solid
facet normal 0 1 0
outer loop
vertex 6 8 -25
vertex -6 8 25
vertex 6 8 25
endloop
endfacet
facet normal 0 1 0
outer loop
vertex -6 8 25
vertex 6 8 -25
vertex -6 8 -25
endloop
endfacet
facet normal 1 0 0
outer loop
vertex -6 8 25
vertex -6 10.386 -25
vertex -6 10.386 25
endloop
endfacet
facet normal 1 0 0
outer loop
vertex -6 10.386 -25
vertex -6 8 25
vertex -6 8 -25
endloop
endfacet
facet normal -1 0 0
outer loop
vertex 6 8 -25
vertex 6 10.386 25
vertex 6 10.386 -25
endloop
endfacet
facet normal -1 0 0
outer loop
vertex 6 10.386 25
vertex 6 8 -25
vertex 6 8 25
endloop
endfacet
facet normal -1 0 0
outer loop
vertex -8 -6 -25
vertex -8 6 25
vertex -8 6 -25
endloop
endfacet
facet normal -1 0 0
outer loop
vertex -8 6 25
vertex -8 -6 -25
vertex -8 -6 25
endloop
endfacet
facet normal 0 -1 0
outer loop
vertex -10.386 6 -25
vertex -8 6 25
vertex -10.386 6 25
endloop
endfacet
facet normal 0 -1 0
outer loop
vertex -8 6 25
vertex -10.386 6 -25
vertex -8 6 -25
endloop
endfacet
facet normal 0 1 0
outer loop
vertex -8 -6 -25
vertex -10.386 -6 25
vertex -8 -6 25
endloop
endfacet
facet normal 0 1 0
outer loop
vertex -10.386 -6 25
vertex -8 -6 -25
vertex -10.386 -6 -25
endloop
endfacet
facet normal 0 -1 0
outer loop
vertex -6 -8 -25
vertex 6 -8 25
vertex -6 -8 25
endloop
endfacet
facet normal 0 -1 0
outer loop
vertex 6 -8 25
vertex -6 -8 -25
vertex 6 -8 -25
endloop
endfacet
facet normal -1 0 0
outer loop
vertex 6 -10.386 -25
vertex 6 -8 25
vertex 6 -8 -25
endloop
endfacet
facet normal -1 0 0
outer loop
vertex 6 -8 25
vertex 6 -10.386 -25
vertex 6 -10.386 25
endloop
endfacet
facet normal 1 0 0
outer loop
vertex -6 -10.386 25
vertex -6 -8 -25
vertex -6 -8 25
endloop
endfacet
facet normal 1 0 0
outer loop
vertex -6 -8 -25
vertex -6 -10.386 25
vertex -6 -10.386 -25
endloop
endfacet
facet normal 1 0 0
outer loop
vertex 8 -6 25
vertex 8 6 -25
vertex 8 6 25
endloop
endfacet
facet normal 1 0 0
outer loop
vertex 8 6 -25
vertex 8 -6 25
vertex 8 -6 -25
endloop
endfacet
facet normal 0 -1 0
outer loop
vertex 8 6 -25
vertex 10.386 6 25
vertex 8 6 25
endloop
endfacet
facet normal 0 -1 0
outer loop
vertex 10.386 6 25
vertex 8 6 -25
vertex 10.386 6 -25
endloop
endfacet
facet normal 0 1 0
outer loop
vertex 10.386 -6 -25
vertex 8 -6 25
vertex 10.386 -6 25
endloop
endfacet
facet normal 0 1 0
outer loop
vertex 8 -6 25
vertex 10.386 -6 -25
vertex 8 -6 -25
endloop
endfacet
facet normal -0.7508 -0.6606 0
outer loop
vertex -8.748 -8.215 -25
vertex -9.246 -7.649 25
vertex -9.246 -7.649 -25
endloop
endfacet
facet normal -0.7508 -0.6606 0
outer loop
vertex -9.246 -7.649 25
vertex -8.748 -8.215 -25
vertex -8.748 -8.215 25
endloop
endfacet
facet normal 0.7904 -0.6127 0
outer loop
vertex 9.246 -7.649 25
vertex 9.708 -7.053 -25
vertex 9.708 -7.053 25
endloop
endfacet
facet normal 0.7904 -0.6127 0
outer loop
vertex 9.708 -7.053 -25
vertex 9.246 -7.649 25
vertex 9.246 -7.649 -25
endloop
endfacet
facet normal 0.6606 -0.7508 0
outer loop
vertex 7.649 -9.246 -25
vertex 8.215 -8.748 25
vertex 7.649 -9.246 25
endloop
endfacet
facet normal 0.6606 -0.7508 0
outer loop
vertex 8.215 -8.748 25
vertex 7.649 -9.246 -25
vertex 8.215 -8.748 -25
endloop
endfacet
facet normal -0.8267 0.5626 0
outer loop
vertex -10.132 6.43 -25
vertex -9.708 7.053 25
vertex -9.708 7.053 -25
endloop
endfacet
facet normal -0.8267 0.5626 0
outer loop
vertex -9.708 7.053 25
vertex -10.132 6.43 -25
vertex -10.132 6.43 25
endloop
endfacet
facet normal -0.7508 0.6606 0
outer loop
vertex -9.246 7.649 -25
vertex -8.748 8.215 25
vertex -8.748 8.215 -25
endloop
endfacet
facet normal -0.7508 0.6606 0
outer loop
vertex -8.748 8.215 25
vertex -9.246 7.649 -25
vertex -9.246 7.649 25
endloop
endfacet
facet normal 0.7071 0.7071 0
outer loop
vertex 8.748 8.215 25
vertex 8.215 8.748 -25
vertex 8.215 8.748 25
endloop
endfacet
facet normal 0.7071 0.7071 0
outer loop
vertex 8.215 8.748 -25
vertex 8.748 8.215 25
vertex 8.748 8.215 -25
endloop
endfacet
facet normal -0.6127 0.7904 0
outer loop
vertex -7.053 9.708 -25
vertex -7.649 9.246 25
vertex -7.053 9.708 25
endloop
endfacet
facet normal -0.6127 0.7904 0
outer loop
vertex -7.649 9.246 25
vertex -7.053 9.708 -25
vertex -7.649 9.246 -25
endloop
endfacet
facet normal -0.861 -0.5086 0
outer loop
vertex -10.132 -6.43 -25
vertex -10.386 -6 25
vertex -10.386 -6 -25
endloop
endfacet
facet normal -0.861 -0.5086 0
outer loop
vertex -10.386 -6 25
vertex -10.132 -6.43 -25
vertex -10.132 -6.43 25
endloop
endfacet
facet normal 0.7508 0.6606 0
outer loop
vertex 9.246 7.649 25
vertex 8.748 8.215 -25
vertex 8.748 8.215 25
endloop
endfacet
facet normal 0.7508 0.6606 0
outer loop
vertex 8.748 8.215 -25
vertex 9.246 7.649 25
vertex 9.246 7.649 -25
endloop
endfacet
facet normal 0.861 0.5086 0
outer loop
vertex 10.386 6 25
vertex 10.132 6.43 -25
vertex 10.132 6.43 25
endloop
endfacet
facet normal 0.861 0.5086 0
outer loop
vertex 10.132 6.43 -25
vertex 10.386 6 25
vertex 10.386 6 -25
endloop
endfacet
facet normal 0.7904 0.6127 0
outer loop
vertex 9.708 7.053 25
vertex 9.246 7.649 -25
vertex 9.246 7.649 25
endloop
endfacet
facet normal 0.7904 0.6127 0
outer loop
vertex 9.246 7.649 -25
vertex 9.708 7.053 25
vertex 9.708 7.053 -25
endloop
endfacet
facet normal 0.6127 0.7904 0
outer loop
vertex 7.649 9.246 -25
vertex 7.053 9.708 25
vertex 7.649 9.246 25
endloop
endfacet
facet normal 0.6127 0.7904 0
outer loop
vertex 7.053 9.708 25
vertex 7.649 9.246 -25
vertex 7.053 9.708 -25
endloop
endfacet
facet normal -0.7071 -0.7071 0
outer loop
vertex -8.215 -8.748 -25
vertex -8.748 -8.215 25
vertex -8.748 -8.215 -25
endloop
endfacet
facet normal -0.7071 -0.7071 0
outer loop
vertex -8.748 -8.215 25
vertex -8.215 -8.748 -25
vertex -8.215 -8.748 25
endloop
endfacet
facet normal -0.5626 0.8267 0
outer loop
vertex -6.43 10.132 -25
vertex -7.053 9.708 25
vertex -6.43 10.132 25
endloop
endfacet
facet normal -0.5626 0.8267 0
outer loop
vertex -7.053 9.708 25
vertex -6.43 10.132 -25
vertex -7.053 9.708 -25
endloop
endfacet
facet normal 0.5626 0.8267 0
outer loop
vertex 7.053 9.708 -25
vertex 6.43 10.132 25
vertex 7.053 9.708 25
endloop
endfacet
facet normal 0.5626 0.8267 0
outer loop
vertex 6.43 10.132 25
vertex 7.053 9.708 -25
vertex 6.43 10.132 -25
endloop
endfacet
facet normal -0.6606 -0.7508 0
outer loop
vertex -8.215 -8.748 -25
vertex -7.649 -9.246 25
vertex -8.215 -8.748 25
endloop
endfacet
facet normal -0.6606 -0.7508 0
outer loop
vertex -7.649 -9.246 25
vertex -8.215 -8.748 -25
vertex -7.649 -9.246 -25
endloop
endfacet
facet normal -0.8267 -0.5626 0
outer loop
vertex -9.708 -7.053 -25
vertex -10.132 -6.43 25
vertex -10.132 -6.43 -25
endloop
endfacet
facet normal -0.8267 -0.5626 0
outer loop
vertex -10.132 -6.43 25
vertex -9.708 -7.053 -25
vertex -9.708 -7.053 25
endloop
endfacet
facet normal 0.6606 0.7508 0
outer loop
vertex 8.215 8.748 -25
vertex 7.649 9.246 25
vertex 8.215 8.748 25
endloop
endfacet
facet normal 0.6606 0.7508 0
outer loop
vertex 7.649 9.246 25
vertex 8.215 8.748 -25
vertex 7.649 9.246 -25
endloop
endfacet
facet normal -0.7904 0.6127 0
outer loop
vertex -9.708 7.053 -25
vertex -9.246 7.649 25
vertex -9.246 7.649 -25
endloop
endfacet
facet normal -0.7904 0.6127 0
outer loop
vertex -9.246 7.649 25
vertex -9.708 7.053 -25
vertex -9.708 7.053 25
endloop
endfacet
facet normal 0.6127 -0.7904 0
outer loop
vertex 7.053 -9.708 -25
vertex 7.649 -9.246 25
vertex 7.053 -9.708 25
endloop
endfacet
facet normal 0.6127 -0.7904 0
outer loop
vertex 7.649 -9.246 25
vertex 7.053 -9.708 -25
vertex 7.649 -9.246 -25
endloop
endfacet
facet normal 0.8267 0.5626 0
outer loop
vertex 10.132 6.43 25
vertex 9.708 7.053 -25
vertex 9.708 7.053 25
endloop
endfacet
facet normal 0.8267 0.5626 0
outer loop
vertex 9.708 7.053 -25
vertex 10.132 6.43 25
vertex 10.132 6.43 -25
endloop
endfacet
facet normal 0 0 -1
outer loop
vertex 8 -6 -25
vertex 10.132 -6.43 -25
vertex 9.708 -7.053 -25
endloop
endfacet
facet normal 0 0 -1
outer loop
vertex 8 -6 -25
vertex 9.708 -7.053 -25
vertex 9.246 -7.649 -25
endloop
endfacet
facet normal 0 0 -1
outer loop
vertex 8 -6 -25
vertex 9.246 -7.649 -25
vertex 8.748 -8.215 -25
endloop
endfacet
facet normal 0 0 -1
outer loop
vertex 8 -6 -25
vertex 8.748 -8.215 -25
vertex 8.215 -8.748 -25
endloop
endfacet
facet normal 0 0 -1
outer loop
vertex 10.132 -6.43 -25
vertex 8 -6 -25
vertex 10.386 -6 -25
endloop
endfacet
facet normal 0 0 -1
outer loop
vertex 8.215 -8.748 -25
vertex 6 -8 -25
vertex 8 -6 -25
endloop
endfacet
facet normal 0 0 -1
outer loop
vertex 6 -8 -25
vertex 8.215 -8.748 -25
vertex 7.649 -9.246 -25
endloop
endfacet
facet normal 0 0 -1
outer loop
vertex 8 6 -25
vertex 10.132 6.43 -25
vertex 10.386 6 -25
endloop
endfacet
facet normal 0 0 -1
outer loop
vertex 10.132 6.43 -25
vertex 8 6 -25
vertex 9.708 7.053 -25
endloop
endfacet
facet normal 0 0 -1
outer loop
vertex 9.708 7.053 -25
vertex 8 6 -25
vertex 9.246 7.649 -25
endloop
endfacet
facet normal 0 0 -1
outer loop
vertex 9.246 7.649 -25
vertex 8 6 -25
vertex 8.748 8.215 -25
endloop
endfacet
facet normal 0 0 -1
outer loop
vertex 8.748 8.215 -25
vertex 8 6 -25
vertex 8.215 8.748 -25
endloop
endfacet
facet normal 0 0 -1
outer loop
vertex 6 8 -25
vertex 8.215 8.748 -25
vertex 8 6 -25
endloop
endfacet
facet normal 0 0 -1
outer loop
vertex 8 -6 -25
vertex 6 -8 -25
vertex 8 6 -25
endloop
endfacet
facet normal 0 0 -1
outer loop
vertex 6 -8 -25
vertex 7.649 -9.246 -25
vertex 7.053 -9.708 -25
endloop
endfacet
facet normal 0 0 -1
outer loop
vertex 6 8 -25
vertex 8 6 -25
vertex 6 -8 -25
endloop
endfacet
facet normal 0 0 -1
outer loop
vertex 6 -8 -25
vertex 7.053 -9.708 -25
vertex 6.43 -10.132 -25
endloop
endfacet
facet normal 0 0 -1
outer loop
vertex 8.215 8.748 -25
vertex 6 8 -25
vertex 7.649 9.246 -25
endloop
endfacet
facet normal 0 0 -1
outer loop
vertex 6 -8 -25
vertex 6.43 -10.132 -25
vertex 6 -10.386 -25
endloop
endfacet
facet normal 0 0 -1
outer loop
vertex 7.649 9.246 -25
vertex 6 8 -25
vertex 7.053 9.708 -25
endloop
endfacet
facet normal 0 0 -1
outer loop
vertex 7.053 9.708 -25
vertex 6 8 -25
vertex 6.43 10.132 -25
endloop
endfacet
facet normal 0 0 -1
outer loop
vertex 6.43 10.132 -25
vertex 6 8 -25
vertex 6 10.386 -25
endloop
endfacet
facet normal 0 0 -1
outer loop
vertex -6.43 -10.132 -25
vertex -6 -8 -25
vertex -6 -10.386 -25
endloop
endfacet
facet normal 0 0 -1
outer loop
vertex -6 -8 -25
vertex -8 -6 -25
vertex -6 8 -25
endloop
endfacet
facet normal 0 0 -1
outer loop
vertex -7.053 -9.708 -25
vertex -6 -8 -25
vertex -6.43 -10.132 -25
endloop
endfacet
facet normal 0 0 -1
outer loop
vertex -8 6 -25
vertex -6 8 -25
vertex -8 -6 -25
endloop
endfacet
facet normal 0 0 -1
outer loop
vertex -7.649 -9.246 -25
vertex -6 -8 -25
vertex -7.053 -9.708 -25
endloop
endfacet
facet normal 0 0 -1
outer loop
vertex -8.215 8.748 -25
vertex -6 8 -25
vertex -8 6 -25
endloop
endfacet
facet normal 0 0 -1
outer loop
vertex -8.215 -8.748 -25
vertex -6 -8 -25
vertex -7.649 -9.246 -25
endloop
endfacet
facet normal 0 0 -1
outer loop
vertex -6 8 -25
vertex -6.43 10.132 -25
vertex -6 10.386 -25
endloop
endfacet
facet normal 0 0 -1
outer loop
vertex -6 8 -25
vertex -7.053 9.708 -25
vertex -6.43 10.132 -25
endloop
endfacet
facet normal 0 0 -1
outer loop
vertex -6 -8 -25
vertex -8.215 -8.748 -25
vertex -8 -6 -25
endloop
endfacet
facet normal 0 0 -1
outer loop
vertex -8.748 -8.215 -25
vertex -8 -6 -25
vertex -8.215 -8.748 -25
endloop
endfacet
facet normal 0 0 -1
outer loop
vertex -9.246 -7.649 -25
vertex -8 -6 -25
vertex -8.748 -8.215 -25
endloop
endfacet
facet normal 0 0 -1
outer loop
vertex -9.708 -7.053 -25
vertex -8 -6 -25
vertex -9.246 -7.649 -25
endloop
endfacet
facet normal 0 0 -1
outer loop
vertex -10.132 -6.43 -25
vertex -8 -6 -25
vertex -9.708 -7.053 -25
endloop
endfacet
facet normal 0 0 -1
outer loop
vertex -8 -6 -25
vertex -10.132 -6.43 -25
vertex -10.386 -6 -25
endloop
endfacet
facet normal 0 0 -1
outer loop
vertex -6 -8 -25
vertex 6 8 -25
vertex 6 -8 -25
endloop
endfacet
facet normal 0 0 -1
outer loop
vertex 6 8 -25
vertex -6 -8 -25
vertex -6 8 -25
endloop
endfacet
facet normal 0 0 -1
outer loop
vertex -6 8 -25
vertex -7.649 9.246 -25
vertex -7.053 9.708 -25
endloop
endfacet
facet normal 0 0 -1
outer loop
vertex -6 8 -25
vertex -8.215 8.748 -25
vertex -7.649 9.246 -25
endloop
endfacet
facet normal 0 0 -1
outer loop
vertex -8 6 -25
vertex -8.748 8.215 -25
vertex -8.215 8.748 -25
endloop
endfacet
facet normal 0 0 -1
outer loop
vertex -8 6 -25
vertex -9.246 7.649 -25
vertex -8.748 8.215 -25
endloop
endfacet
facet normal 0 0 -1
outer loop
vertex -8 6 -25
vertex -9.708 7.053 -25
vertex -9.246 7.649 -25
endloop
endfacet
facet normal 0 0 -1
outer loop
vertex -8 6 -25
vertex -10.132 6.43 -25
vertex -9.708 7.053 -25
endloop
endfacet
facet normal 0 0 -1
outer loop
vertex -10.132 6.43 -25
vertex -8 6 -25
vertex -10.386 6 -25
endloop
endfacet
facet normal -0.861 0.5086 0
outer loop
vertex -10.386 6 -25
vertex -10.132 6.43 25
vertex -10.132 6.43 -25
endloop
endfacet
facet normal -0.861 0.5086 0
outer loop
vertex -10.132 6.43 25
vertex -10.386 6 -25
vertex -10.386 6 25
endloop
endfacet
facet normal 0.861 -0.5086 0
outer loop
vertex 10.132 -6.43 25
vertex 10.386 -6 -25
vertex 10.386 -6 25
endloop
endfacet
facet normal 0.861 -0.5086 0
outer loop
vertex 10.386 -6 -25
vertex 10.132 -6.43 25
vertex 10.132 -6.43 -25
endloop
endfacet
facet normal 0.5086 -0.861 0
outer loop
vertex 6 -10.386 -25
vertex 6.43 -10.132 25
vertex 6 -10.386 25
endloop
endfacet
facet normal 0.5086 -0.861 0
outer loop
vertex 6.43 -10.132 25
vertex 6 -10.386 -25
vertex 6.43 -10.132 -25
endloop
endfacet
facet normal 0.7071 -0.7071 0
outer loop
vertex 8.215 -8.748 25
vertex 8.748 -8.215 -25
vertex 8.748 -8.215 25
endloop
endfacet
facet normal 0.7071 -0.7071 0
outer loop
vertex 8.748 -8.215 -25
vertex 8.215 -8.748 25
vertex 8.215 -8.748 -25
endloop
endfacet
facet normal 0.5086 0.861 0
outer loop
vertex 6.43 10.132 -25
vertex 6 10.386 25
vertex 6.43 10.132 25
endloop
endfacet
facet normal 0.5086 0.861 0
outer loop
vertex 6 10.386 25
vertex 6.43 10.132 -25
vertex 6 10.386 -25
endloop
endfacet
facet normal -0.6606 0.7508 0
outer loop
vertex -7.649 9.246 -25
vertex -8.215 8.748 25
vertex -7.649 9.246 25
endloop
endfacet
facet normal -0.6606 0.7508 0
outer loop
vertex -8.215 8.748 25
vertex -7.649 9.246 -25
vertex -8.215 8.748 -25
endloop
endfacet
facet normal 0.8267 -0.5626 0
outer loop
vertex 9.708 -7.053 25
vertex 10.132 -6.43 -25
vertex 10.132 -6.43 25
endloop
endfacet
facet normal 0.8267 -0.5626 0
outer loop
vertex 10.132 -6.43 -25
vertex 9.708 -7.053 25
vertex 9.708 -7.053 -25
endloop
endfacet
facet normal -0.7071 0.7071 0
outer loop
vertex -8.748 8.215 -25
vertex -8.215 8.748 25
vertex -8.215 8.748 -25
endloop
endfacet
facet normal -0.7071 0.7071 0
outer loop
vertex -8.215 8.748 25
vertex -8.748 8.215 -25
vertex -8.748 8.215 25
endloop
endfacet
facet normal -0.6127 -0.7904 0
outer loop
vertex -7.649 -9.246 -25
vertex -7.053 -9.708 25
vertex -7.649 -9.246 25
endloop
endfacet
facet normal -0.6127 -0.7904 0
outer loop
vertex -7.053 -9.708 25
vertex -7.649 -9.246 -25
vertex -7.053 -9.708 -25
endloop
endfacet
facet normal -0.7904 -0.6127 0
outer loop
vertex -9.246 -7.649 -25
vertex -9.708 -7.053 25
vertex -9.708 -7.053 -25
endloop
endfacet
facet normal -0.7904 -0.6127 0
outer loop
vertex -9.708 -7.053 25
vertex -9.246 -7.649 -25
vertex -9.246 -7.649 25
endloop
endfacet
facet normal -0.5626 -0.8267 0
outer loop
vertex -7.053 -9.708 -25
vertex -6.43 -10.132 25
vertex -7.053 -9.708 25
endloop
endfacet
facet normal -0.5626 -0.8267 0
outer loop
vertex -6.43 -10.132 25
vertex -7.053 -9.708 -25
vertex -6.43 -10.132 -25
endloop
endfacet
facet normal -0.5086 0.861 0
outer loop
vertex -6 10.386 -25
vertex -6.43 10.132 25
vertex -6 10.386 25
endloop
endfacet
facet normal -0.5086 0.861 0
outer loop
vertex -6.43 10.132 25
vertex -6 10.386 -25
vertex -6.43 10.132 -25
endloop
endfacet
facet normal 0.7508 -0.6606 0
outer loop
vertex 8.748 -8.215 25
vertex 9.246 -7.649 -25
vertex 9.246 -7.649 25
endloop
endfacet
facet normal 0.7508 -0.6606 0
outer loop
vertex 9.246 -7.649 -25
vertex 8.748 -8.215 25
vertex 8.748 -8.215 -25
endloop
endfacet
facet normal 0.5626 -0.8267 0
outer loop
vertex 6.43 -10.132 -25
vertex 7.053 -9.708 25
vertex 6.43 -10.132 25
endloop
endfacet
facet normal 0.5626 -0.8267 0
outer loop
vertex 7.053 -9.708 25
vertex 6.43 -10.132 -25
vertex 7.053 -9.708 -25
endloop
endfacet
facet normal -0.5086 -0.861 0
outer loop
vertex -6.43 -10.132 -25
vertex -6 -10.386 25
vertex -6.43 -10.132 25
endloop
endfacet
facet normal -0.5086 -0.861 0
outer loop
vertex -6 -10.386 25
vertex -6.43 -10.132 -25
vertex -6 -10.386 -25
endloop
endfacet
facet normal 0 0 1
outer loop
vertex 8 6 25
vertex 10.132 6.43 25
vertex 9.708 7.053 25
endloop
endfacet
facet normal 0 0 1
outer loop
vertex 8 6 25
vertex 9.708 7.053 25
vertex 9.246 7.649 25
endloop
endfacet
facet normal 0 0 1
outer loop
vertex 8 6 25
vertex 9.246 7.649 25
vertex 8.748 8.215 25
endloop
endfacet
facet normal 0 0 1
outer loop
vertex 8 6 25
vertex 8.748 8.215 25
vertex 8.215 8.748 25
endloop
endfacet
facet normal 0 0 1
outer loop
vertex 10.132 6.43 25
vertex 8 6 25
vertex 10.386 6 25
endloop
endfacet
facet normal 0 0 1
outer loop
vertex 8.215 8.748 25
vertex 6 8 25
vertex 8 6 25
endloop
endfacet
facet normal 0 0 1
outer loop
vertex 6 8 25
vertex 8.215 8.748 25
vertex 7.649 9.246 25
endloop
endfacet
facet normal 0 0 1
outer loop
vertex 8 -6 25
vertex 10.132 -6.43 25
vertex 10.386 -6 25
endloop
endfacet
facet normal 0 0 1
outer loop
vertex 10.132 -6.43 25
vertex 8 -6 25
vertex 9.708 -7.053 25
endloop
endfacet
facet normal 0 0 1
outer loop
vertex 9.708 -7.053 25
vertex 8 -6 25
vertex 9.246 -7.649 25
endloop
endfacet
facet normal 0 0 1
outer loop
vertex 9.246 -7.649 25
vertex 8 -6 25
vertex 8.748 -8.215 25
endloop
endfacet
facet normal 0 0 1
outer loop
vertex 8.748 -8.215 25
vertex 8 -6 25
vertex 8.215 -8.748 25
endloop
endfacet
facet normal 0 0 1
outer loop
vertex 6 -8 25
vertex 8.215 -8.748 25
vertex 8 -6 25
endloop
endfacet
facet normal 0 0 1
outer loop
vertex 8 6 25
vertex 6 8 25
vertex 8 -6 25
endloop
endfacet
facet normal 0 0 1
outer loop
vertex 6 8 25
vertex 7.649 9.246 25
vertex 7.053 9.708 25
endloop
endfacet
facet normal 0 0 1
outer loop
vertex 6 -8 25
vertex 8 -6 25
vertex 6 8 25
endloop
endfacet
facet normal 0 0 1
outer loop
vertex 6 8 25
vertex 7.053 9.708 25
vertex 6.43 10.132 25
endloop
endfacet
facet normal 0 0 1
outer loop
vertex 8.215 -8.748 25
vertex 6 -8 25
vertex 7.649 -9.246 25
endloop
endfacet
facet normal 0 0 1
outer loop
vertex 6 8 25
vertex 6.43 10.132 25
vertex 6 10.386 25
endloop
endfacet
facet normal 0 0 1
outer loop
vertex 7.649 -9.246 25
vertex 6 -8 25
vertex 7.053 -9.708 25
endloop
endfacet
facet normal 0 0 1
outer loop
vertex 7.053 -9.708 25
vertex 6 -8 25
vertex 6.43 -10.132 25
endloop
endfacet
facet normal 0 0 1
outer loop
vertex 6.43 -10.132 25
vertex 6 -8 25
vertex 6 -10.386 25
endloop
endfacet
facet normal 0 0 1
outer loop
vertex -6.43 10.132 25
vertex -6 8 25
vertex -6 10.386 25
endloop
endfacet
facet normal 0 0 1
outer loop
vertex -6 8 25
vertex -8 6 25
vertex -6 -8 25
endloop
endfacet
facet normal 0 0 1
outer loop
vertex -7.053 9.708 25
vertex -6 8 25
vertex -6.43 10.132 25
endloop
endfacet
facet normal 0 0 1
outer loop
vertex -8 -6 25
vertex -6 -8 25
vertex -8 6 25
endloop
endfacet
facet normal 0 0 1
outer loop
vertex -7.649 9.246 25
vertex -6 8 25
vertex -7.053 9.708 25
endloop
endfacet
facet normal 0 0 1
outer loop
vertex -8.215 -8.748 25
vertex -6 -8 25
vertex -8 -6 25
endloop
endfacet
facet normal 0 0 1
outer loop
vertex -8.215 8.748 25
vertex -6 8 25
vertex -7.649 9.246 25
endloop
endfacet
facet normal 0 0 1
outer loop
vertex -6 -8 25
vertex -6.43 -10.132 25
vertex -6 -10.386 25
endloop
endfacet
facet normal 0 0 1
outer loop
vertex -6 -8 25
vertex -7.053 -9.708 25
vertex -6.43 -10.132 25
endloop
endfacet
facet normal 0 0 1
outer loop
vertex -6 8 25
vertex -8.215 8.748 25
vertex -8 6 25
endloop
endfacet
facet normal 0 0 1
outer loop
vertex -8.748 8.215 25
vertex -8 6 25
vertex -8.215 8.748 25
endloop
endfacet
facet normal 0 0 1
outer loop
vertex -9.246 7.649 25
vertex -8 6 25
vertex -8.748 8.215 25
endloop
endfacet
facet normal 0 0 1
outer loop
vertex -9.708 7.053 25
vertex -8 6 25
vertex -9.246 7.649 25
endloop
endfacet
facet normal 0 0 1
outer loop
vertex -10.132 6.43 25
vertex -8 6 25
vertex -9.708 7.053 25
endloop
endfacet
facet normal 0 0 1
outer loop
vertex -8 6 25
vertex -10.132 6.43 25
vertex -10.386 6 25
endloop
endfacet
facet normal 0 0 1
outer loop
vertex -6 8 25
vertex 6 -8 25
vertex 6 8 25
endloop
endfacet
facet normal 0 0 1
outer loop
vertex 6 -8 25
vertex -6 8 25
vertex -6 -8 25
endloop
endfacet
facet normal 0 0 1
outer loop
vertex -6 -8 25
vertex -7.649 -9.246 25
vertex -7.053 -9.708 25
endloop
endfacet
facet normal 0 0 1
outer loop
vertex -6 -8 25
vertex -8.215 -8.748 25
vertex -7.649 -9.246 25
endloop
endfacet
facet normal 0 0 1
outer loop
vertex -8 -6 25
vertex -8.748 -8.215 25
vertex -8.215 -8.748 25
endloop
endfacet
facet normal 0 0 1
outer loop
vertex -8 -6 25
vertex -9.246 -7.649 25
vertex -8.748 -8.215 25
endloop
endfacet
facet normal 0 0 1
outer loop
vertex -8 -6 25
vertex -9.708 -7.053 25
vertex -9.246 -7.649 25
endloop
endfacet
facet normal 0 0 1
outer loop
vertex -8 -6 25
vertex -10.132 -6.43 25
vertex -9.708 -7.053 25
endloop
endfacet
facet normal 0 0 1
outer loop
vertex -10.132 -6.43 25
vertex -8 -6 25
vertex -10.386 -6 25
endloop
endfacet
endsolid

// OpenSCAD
$fn=100;

difference() {
    cylinder(50
    , 12, 12, center=true);
    for (i = [1:4]) {
        rotate([0, 0, 90*i]) translate([14, 0, 0])
        cube([12, 12, 51], center=true);
    }
}
